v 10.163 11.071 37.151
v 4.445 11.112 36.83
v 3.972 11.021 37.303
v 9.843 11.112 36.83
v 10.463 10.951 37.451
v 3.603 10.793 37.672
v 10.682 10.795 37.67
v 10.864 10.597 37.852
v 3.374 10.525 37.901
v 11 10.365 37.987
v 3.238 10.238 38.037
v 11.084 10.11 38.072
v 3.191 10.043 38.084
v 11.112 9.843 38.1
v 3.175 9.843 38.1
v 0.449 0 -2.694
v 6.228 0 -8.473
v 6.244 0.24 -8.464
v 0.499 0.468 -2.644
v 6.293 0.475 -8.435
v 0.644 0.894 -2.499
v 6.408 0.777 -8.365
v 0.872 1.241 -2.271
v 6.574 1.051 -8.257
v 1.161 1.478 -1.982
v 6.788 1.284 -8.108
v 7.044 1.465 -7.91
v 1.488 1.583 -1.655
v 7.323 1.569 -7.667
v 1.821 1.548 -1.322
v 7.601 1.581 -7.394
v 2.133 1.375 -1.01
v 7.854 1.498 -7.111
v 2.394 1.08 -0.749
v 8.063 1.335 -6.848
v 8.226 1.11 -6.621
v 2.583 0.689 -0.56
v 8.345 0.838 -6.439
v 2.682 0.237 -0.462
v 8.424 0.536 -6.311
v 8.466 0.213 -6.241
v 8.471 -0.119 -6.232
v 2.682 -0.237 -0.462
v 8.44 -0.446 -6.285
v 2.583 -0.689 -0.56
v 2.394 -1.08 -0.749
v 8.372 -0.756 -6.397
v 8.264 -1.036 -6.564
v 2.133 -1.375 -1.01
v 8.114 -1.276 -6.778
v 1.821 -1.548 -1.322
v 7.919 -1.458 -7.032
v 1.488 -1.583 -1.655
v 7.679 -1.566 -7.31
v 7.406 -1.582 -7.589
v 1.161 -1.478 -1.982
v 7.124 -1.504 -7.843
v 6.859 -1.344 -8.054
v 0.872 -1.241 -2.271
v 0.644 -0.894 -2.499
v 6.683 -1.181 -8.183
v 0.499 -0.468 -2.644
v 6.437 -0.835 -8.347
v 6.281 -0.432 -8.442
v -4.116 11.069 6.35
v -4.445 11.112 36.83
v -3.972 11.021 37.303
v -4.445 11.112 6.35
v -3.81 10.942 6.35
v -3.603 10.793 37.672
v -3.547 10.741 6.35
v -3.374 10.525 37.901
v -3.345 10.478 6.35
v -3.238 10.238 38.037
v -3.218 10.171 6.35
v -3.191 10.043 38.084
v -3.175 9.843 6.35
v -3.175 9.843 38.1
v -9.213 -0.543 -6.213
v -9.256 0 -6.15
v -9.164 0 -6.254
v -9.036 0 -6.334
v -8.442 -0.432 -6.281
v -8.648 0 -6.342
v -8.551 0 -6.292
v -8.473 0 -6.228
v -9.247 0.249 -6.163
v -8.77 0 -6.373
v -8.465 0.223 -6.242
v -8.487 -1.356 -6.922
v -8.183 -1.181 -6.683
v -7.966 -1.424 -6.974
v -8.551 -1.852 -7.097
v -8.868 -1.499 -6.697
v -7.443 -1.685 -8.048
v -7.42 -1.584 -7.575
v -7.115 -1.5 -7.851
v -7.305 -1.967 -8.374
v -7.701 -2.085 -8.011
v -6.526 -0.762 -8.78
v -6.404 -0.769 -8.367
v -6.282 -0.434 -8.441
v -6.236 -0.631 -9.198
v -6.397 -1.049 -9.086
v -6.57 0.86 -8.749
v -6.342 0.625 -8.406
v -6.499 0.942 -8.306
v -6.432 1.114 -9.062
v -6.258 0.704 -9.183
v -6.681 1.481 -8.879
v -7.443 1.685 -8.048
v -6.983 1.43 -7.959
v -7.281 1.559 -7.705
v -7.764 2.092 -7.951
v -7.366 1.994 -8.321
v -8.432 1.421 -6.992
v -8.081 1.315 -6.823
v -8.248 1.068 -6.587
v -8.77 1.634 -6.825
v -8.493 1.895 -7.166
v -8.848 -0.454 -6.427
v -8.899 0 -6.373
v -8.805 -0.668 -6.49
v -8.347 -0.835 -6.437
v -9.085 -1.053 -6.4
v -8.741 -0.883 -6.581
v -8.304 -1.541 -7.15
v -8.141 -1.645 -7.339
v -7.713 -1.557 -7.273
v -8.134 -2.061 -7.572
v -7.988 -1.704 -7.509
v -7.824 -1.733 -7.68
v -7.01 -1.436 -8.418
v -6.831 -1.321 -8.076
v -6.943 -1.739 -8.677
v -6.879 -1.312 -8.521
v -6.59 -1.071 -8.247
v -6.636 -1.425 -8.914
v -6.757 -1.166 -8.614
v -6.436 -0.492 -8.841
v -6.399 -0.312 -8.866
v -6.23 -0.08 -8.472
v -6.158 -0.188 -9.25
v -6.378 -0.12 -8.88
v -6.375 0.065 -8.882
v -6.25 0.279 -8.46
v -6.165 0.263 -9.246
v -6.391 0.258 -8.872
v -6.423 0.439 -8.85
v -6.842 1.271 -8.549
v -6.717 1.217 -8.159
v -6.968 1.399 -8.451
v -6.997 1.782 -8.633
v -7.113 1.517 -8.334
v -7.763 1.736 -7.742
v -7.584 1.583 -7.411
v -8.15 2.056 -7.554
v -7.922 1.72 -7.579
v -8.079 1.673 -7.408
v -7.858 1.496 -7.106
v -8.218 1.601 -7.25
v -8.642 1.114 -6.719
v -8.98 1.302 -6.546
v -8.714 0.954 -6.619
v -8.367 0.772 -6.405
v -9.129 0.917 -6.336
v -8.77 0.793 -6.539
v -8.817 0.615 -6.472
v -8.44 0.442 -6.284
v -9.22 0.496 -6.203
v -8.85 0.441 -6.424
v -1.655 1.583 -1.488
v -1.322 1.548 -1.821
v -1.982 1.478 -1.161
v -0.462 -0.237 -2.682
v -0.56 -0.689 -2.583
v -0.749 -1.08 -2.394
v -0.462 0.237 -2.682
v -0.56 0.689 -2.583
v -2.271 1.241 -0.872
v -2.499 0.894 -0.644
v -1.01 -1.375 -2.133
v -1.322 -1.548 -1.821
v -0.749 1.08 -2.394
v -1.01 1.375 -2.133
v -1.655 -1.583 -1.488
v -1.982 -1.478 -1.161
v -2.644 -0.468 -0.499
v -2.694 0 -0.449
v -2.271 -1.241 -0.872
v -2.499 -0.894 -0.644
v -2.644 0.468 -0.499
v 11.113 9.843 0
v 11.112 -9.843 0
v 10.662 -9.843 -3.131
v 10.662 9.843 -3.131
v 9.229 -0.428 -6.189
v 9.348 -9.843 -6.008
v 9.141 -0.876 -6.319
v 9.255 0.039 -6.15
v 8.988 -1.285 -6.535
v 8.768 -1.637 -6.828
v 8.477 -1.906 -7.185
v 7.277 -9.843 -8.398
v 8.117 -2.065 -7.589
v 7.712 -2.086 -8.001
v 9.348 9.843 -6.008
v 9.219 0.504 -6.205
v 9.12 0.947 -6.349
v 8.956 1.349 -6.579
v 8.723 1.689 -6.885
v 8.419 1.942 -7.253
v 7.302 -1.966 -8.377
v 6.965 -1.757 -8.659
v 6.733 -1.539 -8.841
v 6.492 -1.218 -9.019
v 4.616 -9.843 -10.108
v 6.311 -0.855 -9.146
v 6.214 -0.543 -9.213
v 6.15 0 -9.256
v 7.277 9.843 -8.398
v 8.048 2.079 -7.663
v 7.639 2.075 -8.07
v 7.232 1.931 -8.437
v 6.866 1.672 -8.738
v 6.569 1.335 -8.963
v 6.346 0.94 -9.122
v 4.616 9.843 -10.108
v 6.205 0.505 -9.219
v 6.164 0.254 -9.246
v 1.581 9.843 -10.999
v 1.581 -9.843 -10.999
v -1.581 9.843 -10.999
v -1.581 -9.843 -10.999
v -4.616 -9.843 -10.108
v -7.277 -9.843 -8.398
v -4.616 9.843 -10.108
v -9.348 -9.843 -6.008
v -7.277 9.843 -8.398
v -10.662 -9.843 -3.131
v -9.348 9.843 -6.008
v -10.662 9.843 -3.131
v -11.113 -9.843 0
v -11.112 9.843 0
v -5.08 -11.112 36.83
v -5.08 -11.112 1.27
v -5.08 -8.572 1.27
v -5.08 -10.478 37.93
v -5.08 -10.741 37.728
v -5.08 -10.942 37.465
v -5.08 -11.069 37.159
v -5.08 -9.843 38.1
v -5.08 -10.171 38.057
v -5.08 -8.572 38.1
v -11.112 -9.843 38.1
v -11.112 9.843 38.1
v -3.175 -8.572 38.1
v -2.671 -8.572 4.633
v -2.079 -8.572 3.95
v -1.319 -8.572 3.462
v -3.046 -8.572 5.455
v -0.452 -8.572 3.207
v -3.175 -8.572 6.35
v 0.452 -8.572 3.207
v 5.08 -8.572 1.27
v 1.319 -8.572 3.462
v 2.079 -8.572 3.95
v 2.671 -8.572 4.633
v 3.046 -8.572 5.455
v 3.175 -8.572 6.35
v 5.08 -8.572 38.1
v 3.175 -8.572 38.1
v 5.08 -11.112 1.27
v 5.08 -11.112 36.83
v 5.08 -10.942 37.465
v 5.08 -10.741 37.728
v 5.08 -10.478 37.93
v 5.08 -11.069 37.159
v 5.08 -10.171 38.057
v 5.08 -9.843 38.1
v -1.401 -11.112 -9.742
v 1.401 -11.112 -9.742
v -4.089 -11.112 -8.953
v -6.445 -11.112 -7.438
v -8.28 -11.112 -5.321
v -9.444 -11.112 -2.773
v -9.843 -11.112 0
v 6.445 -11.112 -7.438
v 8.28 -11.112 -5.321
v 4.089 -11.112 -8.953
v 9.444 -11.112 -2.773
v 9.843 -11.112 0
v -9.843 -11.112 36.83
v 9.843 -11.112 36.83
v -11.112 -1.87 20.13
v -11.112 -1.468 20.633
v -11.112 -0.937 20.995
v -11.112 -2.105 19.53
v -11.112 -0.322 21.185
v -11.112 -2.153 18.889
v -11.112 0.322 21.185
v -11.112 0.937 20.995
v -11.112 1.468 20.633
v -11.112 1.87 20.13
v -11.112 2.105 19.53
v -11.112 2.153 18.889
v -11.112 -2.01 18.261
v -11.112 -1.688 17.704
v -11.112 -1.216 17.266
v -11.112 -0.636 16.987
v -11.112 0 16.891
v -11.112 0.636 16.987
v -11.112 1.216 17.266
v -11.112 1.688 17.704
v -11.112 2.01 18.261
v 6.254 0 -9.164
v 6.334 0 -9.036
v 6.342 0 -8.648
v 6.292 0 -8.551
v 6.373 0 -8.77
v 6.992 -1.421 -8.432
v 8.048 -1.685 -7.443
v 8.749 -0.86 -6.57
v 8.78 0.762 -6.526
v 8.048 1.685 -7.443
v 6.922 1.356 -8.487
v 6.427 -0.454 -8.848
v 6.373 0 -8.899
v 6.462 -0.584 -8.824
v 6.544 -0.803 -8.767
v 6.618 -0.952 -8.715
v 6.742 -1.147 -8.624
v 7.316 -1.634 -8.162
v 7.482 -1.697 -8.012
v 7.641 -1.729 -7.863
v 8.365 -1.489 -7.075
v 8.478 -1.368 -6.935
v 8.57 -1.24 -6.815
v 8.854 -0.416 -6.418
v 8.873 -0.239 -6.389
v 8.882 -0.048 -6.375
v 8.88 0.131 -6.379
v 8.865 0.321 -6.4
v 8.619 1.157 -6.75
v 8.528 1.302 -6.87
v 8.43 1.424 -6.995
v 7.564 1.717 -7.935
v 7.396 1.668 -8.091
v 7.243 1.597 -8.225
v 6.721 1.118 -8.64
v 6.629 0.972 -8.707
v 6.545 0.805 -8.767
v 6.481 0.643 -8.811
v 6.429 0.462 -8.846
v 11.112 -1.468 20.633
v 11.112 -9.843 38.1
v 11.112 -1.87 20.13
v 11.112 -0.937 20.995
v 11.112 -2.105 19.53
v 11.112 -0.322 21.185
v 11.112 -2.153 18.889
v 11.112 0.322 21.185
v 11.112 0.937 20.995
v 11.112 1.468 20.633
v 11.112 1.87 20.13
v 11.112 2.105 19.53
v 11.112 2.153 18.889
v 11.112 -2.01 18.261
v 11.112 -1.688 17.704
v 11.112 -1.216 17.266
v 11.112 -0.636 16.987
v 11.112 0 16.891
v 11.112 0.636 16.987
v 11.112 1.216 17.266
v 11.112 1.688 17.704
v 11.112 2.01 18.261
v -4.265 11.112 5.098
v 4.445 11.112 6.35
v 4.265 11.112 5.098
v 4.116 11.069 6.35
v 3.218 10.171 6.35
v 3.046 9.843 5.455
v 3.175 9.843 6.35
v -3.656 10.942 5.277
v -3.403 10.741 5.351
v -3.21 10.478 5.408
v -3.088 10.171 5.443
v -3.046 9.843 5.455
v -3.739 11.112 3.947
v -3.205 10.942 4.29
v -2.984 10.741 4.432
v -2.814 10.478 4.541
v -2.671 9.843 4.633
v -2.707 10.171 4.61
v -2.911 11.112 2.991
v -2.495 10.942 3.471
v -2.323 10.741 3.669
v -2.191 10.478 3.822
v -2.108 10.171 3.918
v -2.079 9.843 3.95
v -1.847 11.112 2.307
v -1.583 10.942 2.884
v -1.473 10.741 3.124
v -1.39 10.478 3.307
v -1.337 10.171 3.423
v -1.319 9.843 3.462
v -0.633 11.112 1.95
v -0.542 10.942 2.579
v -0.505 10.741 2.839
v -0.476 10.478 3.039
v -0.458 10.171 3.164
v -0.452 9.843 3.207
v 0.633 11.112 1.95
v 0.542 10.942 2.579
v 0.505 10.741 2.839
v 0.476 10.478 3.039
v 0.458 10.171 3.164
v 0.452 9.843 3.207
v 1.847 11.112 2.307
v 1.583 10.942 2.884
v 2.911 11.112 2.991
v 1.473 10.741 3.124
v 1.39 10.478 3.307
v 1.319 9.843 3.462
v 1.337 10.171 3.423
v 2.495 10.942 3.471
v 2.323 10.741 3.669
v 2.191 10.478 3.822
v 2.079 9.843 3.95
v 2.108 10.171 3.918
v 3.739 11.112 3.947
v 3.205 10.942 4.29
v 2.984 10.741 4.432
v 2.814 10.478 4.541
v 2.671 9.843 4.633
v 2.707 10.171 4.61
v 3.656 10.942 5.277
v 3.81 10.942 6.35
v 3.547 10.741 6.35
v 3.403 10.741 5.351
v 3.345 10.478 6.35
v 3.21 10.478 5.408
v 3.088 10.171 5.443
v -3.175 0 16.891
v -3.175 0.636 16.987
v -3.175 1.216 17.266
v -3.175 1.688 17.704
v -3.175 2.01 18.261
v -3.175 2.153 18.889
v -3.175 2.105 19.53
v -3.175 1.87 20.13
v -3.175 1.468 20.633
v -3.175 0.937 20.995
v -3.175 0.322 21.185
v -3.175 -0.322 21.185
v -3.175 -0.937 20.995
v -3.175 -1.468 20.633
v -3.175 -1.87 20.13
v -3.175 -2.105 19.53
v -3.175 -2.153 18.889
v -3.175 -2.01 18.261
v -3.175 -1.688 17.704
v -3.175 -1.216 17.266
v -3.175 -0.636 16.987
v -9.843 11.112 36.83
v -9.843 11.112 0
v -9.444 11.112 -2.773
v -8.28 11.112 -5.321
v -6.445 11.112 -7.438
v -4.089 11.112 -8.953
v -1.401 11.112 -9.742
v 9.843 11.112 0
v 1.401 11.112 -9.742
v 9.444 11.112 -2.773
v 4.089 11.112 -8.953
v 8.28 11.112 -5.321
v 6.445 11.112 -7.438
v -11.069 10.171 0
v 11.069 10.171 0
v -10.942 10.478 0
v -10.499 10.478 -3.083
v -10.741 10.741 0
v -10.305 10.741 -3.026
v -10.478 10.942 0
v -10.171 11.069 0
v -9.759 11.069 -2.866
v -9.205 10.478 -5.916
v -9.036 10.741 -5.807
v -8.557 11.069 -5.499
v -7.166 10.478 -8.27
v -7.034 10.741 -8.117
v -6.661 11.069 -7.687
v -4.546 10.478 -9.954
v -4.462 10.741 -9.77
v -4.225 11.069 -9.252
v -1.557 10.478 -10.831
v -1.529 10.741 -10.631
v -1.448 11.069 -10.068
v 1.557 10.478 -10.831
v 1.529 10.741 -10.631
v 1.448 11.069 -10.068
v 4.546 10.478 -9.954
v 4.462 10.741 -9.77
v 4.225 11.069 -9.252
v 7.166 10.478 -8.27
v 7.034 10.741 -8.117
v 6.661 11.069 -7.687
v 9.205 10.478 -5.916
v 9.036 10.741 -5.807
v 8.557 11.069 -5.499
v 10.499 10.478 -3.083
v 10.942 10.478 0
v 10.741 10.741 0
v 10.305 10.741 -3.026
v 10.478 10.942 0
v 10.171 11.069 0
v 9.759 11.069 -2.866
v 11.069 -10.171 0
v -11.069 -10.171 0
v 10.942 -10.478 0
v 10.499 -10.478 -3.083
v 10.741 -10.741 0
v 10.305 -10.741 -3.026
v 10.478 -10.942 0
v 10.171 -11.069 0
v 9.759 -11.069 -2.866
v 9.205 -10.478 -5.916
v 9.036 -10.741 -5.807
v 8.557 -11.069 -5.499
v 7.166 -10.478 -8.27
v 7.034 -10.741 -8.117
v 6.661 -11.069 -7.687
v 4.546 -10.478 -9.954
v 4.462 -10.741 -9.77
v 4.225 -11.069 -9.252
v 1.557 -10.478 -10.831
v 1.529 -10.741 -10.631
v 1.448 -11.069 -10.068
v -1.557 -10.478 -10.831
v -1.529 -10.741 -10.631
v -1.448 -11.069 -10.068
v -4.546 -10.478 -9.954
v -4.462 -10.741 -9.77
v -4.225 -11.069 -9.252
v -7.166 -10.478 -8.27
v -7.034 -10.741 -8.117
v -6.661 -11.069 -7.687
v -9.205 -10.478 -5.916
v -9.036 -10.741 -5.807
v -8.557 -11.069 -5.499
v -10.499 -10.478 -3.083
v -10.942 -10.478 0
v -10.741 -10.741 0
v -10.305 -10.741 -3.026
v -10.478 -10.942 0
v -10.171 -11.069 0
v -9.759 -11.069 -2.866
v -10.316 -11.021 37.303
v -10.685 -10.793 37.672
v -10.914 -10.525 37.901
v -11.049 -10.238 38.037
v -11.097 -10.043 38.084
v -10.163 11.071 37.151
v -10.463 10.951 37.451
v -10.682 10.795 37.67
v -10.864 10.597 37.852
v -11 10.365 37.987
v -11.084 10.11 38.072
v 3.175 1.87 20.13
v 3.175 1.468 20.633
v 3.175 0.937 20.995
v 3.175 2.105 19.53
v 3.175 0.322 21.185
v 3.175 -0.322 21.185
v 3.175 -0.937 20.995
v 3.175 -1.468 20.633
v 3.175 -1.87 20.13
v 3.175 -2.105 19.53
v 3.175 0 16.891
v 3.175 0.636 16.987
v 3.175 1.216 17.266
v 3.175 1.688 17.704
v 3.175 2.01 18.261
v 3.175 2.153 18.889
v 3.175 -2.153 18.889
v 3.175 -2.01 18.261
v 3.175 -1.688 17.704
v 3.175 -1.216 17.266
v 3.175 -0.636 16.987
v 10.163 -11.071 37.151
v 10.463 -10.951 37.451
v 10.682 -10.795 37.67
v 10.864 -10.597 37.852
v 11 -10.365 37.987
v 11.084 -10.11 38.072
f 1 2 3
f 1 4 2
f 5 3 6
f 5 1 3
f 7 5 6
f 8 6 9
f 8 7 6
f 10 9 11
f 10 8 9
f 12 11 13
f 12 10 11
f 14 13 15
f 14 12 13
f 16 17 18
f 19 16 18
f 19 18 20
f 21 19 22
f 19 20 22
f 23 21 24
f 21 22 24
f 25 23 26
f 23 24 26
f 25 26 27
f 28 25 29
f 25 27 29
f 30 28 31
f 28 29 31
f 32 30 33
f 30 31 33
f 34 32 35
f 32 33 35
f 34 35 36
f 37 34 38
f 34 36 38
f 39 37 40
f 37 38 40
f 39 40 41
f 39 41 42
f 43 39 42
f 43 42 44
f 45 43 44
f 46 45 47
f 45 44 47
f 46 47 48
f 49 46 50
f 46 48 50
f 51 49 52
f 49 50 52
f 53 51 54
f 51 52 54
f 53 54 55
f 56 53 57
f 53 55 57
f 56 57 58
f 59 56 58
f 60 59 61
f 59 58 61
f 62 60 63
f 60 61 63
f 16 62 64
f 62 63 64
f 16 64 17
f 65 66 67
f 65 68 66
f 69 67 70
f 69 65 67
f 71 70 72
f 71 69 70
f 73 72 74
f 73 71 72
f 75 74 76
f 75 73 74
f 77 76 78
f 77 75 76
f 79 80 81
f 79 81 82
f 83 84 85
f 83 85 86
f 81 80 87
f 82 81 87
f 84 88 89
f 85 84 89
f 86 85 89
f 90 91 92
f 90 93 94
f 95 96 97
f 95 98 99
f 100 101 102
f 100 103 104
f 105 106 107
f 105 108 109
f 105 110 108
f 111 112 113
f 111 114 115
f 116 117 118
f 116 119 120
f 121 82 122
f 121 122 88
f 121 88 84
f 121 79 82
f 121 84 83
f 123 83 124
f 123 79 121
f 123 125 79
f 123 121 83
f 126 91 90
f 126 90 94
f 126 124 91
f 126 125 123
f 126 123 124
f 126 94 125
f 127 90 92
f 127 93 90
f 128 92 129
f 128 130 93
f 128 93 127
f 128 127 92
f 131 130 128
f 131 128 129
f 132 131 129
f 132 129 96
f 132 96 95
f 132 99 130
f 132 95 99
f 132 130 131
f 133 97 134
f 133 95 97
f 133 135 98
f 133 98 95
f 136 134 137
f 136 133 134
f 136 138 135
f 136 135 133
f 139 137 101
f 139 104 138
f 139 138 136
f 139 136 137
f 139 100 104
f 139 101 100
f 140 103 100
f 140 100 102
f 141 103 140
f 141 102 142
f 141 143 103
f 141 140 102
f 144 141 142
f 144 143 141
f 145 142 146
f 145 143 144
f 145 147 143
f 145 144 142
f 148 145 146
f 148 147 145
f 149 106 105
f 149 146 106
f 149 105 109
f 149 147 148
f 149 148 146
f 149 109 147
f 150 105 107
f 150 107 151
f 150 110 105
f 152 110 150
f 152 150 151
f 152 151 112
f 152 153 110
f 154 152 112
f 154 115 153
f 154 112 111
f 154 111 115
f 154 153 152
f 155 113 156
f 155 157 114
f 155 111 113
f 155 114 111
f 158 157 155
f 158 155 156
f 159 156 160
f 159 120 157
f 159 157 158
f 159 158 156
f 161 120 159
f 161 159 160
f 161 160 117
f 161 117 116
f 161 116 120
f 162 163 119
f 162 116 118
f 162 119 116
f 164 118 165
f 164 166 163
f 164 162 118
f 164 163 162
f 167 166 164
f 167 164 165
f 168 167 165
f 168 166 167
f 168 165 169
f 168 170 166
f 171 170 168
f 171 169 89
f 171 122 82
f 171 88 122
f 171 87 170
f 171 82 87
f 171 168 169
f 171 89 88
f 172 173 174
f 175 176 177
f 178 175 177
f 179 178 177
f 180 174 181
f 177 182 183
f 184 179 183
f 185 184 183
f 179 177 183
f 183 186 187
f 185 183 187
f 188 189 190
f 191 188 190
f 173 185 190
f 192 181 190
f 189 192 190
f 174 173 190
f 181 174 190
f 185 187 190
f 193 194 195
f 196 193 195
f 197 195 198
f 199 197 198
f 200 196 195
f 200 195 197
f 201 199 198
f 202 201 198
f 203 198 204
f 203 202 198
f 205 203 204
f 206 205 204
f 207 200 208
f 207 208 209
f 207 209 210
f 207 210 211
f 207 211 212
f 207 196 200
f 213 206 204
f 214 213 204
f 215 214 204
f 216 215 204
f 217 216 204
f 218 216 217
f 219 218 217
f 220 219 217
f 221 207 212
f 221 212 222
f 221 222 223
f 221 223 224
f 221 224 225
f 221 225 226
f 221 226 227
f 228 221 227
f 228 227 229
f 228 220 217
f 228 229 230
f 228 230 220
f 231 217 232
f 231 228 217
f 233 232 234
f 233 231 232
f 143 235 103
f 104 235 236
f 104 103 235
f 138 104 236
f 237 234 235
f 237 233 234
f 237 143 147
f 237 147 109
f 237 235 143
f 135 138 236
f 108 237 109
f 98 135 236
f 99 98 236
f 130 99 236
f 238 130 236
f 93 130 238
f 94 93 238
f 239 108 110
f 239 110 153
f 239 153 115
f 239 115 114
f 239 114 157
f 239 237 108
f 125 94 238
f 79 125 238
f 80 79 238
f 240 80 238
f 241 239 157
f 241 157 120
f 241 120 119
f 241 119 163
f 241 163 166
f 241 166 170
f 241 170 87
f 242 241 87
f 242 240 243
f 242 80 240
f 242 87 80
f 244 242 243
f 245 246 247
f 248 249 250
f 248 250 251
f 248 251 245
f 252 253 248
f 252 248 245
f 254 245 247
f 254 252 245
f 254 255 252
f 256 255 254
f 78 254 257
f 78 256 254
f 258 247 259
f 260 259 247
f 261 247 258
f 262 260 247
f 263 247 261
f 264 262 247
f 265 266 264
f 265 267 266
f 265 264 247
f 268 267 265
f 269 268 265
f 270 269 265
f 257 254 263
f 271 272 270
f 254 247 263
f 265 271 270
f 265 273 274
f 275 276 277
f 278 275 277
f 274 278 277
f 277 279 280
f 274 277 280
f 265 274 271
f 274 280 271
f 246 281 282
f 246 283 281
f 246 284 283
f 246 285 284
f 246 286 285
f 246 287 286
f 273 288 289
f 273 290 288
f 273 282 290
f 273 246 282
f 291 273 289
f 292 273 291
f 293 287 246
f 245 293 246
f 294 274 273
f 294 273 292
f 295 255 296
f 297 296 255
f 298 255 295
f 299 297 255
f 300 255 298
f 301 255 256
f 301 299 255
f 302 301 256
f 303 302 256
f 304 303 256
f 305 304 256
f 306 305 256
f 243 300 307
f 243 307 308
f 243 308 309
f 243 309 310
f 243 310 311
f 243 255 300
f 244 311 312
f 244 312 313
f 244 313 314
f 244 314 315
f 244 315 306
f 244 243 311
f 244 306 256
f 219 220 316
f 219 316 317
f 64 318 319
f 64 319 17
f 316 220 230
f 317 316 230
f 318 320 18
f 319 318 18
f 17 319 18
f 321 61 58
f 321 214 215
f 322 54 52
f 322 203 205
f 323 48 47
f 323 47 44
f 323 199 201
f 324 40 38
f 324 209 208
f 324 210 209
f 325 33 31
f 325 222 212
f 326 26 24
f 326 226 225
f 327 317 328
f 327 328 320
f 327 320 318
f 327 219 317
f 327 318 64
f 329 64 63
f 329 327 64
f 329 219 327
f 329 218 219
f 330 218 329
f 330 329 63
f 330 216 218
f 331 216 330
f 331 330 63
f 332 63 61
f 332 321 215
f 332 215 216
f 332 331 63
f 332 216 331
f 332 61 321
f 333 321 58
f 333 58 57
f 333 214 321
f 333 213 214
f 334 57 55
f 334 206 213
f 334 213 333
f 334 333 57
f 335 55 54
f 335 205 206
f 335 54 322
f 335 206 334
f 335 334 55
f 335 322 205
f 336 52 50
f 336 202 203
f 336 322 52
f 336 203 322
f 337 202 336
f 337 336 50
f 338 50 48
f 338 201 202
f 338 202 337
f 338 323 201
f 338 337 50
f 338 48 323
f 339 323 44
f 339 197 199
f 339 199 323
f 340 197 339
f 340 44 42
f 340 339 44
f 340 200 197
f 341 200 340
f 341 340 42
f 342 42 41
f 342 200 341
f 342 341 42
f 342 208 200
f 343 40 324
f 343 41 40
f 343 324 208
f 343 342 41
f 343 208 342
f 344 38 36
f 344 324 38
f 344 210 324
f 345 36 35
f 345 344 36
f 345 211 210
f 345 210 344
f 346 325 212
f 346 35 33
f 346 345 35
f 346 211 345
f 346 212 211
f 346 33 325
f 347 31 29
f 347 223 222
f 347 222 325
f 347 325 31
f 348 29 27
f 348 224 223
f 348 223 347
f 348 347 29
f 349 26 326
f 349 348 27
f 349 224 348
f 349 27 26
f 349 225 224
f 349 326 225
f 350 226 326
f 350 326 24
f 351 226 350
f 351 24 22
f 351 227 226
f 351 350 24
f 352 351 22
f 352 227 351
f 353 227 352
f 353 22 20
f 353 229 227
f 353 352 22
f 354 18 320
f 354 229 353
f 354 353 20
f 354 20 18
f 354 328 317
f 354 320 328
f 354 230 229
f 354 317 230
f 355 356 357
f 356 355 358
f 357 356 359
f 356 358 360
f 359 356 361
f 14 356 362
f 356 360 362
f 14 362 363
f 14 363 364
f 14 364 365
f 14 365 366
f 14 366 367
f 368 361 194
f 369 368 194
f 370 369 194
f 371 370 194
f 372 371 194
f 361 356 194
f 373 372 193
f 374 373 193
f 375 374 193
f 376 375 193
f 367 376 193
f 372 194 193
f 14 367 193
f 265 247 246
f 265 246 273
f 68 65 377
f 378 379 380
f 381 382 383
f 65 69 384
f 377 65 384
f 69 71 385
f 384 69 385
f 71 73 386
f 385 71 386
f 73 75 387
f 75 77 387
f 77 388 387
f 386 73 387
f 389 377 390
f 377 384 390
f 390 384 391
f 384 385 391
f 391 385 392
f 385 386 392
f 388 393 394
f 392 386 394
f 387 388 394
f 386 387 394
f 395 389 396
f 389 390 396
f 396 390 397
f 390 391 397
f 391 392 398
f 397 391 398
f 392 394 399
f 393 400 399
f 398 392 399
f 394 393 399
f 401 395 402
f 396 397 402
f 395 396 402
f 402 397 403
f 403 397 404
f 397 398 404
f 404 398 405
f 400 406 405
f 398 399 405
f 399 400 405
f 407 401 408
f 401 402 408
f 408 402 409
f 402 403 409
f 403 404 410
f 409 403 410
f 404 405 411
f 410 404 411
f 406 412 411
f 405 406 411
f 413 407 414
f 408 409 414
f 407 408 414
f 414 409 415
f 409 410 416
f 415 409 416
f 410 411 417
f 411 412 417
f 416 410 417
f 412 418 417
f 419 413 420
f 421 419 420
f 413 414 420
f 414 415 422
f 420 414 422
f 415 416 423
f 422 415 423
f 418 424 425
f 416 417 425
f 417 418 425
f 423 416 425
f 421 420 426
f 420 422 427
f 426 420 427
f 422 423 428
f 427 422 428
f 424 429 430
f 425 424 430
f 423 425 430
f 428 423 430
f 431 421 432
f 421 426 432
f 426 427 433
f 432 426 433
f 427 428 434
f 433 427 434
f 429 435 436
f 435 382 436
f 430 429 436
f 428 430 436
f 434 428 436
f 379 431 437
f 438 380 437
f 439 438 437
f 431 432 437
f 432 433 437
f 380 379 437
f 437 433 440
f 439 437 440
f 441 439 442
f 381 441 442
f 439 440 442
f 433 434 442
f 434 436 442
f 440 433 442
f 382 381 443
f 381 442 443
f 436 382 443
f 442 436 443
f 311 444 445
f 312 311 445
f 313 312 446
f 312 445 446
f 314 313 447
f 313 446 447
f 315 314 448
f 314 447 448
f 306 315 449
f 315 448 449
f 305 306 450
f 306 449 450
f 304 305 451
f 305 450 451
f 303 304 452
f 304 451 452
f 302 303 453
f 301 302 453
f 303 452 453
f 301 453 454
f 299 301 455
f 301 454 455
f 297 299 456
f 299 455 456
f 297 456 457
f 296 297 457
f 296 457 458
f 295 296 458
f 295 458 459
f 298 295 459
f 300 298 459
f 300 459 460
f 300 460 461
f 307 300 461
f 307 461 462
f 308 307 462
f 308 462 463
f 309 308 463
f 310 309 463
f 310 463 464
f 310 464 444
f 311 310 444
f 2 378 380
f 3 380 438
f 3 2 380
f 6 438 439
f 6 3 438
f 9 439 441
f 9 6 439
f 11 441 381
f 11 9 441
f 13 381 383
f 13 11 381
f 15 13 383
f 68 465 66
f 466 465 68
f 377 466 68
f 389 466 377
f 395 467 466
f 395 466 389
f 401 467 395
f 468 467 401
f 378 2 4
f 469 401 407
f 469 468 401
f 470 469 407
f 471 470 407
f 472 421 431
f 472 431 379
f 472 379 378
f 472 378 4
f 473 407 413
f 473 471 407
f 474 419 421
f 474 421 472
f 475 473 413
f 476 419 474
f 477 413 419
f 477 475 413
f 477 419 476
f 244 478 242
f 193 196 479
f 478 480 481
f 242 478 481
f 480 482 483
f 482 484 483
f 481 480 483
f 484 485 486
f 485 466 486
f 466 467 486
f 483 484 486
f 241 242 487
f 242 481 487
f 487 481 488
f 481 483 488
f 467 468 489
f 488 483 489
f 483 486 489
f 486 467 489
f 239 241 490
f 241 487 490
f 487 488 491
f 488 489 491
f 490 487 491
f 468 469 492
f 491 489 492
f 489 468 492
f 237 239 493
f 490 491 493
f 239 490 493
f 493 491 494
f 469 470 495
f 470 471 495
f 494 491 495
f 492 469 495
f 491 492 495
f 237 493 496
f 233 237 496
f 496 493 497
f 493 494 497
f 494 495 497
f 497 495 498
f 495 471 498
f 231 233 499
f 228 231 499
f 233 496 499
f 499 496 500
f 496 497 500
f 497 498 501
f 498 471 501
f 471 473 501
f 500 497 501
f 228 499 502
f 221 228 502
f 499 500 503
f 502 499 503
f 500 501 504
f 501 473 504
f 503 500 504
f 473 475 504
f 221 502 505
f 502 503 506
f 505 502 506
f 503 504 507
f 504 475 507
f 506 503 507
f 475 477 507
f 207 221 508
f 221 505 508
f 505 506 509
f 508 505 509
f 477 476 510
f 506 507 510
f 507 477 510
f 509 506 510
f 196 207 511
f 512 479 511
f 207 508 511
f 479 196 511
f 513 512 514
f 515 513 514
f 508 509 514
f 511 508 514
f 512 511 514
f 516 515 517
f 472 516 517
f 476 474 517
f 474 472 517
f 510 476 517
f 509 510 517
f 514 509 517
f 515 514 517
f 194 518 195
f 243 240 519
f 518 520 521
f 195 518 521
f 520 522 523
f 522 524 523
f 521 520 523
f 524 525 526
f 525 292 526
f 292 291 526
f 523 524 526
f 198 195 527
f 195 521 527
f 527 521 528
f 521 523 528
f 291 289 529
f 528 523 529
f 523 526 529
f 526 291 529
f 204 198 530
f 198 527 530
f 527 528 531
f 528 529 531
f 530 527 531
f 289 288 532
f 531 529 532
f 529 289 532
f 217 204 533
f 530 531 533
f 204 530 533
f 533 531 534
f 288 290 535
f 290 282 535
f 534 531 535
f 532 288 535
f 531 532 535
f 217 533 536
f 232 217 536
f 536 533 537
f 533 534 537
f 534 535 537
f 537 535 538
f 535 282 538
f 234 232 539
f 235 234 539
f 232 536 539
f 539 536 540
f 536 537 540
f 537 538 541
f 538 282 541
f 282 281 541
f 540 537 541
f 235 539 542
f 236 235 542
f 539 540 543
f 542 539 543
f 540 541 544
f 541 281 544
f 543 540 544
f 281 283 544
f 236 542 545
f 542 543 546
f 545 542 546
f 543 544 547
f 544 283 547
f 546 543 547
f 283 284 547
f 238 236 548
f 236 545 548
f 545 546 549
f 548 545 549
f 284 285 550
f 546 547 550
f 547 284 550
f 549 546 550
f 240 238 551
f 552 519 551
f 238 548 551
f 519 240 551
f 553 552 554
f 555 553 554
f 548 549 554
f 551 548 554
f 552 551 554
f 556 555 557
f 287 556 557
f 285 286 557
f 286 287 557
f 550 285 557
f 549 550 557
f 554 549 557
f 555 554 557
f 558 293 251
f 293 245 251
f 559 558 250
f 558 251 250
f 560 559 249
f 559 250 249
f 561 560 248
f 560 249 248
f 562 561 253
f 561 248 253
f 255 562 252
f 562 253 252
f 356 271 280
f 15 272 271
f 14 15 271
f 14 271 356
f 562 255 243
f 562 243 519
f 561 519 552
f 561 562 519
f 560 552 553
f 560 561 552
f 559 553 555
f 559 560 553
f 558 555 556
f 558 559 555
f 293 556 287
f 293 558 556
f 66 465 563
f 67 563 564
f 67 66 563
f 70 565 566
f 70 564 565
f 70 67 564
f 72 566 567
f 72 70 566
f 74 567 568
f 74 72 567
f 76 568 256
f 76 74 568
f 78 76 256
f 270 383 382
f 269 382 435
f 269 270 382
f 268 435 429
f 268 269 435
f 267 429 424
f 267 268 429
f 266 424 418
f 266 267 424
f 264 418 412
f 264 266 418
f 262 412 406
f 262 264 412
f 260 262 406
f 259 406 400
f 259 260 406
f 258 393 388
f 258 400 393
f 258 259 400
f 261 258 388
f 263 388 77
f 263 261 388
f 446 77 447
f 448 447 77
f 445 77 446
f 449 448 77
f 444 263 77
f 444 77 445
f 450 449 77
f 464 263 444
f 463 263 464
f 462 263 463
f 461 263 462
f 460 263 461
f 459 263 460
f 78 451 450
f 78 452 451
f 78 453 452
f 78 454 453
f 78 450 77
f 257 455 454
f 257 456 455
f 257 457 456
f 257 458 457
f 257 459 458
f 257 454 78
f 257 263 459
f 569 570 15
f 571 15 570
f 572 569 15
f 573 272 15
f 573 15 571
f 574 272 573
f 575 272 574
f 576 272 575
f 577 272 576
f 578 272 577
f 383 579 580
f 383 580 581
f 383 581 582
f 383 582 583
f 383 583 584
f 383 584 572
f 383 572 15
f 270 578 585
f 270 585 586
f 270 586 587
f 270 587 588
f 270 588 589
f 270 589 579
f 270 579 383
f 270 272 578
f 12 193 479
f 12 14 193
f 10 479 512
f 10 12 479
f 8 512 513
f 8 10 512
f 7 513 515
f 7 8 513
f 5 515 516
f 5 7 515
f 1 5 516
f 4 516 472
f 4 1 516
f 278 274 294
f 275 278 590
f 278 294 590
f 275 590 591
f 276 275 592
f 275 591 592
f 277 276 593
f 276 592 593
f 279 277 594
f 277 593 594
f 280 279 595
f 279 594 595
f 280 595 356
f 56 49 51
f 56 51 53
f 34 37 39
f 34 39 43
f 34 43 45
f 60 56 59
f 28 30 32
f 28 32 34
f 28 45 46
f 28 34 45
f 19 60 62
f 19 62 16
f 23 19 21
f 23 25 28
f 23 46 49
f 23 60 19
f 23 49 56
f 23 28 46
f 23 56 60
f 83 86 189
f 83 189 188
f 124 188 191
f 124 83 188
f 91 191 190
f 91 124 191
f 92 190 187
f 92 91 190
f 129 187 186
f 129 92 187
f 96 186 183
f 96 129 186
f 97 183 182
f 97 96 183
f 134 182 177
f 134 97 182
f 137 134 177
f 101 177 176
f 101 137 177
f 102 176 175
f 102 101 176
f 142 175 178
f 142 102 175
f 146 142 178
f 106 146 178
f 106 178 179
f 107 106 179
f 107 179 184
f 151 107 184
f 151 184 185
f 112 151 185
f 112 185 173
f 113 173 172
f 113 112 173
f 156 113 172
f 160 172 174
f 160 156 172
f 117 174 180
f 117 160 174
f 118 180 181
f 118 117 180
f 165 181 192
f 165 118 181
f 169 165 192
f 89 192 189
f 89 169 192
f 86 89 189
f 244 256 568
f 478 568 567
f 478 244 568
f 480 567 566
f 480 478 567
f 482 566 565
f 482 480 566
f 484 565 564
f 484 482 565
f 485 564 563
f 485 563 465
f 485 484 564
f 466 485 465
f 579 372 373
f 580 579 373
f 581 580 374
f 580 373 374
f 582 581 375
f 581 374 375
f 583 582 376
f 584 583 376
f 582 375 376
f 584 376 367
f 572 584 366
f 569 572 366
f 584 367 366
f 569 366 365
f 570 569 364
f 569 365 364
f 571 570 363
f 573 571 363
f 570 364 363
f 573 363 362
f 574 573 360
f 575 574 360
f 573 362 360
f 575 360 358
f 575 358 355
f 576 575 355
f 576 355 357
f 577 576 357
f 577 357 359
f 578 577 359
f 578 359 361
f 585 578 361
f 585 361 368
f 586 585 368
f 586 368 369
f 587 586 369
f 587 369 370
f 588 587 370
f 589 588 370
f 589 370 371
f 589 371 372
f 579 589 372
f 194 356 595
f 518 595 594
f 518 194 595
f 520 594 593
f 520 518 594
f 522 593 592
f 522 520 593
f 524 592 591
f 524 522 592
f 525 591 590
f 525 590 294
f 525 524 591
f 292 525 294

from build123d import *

# Parameters (mm, degrees)
SKETCH1_W                       = 22.225
SKETCH1_H                       = 22.225
BOSS_EXTRUDE1_DEPTH             = 38.1
BOSS_EXTRUDE3_REACH             = 43.214
BOSS_EXTRUDE3_DIRECTION_2_REACH = 43.214
SKETCH4_R                       = 2.159
CUT_EXTRUDE1_DEPTH              = 46.486792383
SKETCH8_R                       = 1.5875
CUT_EXTRUDE3_DEPTH              = 8.89
SKETCH7_R                       = 1.5875
CUT_EXTRUDE4_DEPTH              = 8.89
CUT_EXTRUDE6_DEPTH              = 46.486792456
FILLET1_R                       = 0.508
FILLET15_R                      = 1.27
BOSS_EXTRUDE15_DEPTH            = 2.54
SKETCH18_W                      = 10.16
SKETCH18_H                      = 6.120141002
CUT_EXTRUDE7_DEPTH              = 36.83


with BuildPart() as part:
    # Sketch1 → Boss-Extrude1 (new body)
    with BuildSketch(Plane.XY):
        Rectangle(SKETCH1_W, SKETCH1_H)
    extrude(amount=BOSS_EXTRUDE1_DEPTH)

    # Boss-Extrude3: up to this face of the body (flat: up to its plane)
    boss_extrude3_end = Plane(part.part.faces().sort_by_distance((0, 11.1125, 19.05))[0])
    # Sketch3 → Boss-Extrude3 (add, up to the picked face)
    with BuildSketch(Plane(origin=(0, 0, 0), x_dir=(1, 0, 0), z_dir=(0, 1, 0)), mode=Mode.PRIVATE) as boss_extrude3_sk1:
        with BuildLine():
            Line((-11.1125, 0), (11.1125, 0))
            ThreePointArc((11.1125, 0), (0, 11.1125), (-11.1125, 0))
        make_face()
    boss_extrude3_tool1 = split(extrude(boss_extrude3_sk1.sketch, amount=BOSS_EXTRUDE3_REACH, mode=Mode.PRIVATE), bisect_by=boss_extrude3_end, keep=Keep.BOTH, mode=Mode.PRIVATE)
    add(boss_extrude3_tool1.solids().sort_by(Axis((0, 0, -4.716291), (0, 1, 0)))[0])

    # Boss-Extrude3 direction 2: up to this face of the body (flat: up to its plane)
    boss_extrude3_direction_2_end = Plane(part.part.faces().sort_by_distance((0, -11.1125, 19.05))[0])
    # Sketch3 → Boss-Extrude3 direction 2 (add, up to the picked face)
    with BuildSketch(Plane(origin=(0, 0, 0), x_dir=(1, 0, 0), z_dir=(0, 1, 0)), mode=Mode.PRIVATE) as boss_extrude3_direction_2_sk1:
        with BuildLine():
            Line((-11.1125, 0), (11.1125, 0))
            ThreePointArc((11.1125, 0), (0, 11.1125), (-11.1125, 0))
        make_face()
    boss_extrude3_direction_2_tool1 = split(extrude(boss_extrude3_direction_2_sk1.sketch, amount=-BOSS_EXTRUDE3_DIRECTION_2_REACH, mode=Mode.PRIVATE), bisect_by=boss_extrude3_direction_2_end, keep=Keep.BOTH, mode=Mode.PRIVATE)
    add(boss_extrude3_direction_2_tool1.solids().sort_by(Axis((0, 0, -4.716291), (0, -1, 0)))[0])

    # Sketch4 → Cut-Extrude1 (cut, through all)
    with BuildSketch(Plane(origin=(11.1125, 0, 0), x_dir=(0, 0, -1), z_dir=(1, 0, 0))):
        with Locations((-19.05, 0)):
            Circle(SKETCH4_R)
    extrude(amount=-CUT_EXTRUDE1_DEPTH, mode=Mode.SUBTRACT)

    # Sketch8 → Cut-Extrude3 (cut)
    with BuildSketch(Plane(origin=(7.857724106, 0, -7.857724106), x_dir=(-0.7071067811865515, 0, -0.7071067811865436), z_dir=(0.7071067811865436, 0, -0.7071067811865515))):
        Circle(SKETCH8_R)
    extrude(amount=-CUT_EXTRUDE3_DEPTH, mode=Mode.SUBTRACT)

    # Sketch7 → Cut-Extrude4 (cut)
    with BuildSketch(Plane(origin=(-7.857724106, 0, -7.857724106), x_dir=(0.7071067811865512, 0, -0.7071067811865439), z_dir=(0.7071067811865439, 0, 0.7071067811865512))):
        with Locations(Location((0, 0, 0), (0, 0, 180))):
            Circle(SKETCH7_R)
    extrude(amount=CUT_EXTRUDE4_DEPTH, mode=Mode.SUBTRACT)

    # Sketch10 → Cut-Extrude6 (cut, through all)
    with BuildSketch(Plane(origin=(0, -11.1125, 0), x_dir=(-1, 0, 0), z_dir=(0, -1, 0))):
        with BuildLine():
            Line((3.175, -6.35), (3.175, -44.45))
            ThreePointArc((3.175, -44.45), (0, -47.625), (-3.175, -44.45))
            Line((-3.175, -44.45), (-3.175, -6.35))
            ThreePointArc((-3.175, -6.35), (0, -3.175), (3.175, -6.35))
        make_face()
    extrude(amount=-CUT_EXTRUDE6_DEPTH, mode=Mode.SUBTRACT)

    # Fillet1
    fillet1_edges = [part.edges().sort_by_distance(p)[0] for p in [
        (8.89966195, 5e-09, -6.654597918),
        (-6.654597918, -5e-09, -8.89966195),
    ]]
    fillet(fillet1_edges, radius=FILLET1_R)

    # Fillet15
    fillet15_edges = [part.edges().sort_by_distance(p)[0] for p in [
        (-7.14375, -11.1125, 38.1),
        (0, 11.1125, -11.1125),
        (0, -11.1125, -11.1125),
        (-7.14375, 11.1125, 38.1),
        (7.14375, -11.1125, 38.1),
        (-3.175, 11.1125, 22.225),
        (3.175, 11.1125, 22.225),
        (0, 11.1125, 3.175),
        (-3.175, -11.1125, 22.225),
        (0, -11.1125, 3.175),
        (3.175, -11.1125, 22.225),
        (7.14375, 11.1125, 38.1),
        (11.1125, -11.1125, 19.05),
        (-11.1125, -11.1125, 19.05),
        (-11.1125, 11.1125, 19.05),
        (11.1125, 11.1125, 19.05),
    ]]
    fillet(fillet15_edges, radius=FILLET15_R)

    # Sketch14 → Boss-Extrude15 (add, symmetric)
    with BuildSketch(Plane(origin=(0, 0, 0), x_dir=(1, 0, 0), z_dir=(0, 1, 0))):
        Polygon((0.332639056, 2.225283), (-2.103732557, -0.211088613), (0.082871249, -2.397692418), (2.519242862, 0.038679195), align=None)
    extrude(amount=BOSS_EXTRUDE15_DEPTH, both=True)

    # Sketch18 → Cut-Extrude7 (cut)
    with BuildSketch(Plane.XY.offset(38.1)):
        with Locations((0, -11.632570501)):
            Rectangle(SKETCH18_W, SKETCH18_H)
    extrude(amount=-CUT_EXTRUDE7_DEPTH, mode=Mode.SUBTRACT)


solid = part.part
